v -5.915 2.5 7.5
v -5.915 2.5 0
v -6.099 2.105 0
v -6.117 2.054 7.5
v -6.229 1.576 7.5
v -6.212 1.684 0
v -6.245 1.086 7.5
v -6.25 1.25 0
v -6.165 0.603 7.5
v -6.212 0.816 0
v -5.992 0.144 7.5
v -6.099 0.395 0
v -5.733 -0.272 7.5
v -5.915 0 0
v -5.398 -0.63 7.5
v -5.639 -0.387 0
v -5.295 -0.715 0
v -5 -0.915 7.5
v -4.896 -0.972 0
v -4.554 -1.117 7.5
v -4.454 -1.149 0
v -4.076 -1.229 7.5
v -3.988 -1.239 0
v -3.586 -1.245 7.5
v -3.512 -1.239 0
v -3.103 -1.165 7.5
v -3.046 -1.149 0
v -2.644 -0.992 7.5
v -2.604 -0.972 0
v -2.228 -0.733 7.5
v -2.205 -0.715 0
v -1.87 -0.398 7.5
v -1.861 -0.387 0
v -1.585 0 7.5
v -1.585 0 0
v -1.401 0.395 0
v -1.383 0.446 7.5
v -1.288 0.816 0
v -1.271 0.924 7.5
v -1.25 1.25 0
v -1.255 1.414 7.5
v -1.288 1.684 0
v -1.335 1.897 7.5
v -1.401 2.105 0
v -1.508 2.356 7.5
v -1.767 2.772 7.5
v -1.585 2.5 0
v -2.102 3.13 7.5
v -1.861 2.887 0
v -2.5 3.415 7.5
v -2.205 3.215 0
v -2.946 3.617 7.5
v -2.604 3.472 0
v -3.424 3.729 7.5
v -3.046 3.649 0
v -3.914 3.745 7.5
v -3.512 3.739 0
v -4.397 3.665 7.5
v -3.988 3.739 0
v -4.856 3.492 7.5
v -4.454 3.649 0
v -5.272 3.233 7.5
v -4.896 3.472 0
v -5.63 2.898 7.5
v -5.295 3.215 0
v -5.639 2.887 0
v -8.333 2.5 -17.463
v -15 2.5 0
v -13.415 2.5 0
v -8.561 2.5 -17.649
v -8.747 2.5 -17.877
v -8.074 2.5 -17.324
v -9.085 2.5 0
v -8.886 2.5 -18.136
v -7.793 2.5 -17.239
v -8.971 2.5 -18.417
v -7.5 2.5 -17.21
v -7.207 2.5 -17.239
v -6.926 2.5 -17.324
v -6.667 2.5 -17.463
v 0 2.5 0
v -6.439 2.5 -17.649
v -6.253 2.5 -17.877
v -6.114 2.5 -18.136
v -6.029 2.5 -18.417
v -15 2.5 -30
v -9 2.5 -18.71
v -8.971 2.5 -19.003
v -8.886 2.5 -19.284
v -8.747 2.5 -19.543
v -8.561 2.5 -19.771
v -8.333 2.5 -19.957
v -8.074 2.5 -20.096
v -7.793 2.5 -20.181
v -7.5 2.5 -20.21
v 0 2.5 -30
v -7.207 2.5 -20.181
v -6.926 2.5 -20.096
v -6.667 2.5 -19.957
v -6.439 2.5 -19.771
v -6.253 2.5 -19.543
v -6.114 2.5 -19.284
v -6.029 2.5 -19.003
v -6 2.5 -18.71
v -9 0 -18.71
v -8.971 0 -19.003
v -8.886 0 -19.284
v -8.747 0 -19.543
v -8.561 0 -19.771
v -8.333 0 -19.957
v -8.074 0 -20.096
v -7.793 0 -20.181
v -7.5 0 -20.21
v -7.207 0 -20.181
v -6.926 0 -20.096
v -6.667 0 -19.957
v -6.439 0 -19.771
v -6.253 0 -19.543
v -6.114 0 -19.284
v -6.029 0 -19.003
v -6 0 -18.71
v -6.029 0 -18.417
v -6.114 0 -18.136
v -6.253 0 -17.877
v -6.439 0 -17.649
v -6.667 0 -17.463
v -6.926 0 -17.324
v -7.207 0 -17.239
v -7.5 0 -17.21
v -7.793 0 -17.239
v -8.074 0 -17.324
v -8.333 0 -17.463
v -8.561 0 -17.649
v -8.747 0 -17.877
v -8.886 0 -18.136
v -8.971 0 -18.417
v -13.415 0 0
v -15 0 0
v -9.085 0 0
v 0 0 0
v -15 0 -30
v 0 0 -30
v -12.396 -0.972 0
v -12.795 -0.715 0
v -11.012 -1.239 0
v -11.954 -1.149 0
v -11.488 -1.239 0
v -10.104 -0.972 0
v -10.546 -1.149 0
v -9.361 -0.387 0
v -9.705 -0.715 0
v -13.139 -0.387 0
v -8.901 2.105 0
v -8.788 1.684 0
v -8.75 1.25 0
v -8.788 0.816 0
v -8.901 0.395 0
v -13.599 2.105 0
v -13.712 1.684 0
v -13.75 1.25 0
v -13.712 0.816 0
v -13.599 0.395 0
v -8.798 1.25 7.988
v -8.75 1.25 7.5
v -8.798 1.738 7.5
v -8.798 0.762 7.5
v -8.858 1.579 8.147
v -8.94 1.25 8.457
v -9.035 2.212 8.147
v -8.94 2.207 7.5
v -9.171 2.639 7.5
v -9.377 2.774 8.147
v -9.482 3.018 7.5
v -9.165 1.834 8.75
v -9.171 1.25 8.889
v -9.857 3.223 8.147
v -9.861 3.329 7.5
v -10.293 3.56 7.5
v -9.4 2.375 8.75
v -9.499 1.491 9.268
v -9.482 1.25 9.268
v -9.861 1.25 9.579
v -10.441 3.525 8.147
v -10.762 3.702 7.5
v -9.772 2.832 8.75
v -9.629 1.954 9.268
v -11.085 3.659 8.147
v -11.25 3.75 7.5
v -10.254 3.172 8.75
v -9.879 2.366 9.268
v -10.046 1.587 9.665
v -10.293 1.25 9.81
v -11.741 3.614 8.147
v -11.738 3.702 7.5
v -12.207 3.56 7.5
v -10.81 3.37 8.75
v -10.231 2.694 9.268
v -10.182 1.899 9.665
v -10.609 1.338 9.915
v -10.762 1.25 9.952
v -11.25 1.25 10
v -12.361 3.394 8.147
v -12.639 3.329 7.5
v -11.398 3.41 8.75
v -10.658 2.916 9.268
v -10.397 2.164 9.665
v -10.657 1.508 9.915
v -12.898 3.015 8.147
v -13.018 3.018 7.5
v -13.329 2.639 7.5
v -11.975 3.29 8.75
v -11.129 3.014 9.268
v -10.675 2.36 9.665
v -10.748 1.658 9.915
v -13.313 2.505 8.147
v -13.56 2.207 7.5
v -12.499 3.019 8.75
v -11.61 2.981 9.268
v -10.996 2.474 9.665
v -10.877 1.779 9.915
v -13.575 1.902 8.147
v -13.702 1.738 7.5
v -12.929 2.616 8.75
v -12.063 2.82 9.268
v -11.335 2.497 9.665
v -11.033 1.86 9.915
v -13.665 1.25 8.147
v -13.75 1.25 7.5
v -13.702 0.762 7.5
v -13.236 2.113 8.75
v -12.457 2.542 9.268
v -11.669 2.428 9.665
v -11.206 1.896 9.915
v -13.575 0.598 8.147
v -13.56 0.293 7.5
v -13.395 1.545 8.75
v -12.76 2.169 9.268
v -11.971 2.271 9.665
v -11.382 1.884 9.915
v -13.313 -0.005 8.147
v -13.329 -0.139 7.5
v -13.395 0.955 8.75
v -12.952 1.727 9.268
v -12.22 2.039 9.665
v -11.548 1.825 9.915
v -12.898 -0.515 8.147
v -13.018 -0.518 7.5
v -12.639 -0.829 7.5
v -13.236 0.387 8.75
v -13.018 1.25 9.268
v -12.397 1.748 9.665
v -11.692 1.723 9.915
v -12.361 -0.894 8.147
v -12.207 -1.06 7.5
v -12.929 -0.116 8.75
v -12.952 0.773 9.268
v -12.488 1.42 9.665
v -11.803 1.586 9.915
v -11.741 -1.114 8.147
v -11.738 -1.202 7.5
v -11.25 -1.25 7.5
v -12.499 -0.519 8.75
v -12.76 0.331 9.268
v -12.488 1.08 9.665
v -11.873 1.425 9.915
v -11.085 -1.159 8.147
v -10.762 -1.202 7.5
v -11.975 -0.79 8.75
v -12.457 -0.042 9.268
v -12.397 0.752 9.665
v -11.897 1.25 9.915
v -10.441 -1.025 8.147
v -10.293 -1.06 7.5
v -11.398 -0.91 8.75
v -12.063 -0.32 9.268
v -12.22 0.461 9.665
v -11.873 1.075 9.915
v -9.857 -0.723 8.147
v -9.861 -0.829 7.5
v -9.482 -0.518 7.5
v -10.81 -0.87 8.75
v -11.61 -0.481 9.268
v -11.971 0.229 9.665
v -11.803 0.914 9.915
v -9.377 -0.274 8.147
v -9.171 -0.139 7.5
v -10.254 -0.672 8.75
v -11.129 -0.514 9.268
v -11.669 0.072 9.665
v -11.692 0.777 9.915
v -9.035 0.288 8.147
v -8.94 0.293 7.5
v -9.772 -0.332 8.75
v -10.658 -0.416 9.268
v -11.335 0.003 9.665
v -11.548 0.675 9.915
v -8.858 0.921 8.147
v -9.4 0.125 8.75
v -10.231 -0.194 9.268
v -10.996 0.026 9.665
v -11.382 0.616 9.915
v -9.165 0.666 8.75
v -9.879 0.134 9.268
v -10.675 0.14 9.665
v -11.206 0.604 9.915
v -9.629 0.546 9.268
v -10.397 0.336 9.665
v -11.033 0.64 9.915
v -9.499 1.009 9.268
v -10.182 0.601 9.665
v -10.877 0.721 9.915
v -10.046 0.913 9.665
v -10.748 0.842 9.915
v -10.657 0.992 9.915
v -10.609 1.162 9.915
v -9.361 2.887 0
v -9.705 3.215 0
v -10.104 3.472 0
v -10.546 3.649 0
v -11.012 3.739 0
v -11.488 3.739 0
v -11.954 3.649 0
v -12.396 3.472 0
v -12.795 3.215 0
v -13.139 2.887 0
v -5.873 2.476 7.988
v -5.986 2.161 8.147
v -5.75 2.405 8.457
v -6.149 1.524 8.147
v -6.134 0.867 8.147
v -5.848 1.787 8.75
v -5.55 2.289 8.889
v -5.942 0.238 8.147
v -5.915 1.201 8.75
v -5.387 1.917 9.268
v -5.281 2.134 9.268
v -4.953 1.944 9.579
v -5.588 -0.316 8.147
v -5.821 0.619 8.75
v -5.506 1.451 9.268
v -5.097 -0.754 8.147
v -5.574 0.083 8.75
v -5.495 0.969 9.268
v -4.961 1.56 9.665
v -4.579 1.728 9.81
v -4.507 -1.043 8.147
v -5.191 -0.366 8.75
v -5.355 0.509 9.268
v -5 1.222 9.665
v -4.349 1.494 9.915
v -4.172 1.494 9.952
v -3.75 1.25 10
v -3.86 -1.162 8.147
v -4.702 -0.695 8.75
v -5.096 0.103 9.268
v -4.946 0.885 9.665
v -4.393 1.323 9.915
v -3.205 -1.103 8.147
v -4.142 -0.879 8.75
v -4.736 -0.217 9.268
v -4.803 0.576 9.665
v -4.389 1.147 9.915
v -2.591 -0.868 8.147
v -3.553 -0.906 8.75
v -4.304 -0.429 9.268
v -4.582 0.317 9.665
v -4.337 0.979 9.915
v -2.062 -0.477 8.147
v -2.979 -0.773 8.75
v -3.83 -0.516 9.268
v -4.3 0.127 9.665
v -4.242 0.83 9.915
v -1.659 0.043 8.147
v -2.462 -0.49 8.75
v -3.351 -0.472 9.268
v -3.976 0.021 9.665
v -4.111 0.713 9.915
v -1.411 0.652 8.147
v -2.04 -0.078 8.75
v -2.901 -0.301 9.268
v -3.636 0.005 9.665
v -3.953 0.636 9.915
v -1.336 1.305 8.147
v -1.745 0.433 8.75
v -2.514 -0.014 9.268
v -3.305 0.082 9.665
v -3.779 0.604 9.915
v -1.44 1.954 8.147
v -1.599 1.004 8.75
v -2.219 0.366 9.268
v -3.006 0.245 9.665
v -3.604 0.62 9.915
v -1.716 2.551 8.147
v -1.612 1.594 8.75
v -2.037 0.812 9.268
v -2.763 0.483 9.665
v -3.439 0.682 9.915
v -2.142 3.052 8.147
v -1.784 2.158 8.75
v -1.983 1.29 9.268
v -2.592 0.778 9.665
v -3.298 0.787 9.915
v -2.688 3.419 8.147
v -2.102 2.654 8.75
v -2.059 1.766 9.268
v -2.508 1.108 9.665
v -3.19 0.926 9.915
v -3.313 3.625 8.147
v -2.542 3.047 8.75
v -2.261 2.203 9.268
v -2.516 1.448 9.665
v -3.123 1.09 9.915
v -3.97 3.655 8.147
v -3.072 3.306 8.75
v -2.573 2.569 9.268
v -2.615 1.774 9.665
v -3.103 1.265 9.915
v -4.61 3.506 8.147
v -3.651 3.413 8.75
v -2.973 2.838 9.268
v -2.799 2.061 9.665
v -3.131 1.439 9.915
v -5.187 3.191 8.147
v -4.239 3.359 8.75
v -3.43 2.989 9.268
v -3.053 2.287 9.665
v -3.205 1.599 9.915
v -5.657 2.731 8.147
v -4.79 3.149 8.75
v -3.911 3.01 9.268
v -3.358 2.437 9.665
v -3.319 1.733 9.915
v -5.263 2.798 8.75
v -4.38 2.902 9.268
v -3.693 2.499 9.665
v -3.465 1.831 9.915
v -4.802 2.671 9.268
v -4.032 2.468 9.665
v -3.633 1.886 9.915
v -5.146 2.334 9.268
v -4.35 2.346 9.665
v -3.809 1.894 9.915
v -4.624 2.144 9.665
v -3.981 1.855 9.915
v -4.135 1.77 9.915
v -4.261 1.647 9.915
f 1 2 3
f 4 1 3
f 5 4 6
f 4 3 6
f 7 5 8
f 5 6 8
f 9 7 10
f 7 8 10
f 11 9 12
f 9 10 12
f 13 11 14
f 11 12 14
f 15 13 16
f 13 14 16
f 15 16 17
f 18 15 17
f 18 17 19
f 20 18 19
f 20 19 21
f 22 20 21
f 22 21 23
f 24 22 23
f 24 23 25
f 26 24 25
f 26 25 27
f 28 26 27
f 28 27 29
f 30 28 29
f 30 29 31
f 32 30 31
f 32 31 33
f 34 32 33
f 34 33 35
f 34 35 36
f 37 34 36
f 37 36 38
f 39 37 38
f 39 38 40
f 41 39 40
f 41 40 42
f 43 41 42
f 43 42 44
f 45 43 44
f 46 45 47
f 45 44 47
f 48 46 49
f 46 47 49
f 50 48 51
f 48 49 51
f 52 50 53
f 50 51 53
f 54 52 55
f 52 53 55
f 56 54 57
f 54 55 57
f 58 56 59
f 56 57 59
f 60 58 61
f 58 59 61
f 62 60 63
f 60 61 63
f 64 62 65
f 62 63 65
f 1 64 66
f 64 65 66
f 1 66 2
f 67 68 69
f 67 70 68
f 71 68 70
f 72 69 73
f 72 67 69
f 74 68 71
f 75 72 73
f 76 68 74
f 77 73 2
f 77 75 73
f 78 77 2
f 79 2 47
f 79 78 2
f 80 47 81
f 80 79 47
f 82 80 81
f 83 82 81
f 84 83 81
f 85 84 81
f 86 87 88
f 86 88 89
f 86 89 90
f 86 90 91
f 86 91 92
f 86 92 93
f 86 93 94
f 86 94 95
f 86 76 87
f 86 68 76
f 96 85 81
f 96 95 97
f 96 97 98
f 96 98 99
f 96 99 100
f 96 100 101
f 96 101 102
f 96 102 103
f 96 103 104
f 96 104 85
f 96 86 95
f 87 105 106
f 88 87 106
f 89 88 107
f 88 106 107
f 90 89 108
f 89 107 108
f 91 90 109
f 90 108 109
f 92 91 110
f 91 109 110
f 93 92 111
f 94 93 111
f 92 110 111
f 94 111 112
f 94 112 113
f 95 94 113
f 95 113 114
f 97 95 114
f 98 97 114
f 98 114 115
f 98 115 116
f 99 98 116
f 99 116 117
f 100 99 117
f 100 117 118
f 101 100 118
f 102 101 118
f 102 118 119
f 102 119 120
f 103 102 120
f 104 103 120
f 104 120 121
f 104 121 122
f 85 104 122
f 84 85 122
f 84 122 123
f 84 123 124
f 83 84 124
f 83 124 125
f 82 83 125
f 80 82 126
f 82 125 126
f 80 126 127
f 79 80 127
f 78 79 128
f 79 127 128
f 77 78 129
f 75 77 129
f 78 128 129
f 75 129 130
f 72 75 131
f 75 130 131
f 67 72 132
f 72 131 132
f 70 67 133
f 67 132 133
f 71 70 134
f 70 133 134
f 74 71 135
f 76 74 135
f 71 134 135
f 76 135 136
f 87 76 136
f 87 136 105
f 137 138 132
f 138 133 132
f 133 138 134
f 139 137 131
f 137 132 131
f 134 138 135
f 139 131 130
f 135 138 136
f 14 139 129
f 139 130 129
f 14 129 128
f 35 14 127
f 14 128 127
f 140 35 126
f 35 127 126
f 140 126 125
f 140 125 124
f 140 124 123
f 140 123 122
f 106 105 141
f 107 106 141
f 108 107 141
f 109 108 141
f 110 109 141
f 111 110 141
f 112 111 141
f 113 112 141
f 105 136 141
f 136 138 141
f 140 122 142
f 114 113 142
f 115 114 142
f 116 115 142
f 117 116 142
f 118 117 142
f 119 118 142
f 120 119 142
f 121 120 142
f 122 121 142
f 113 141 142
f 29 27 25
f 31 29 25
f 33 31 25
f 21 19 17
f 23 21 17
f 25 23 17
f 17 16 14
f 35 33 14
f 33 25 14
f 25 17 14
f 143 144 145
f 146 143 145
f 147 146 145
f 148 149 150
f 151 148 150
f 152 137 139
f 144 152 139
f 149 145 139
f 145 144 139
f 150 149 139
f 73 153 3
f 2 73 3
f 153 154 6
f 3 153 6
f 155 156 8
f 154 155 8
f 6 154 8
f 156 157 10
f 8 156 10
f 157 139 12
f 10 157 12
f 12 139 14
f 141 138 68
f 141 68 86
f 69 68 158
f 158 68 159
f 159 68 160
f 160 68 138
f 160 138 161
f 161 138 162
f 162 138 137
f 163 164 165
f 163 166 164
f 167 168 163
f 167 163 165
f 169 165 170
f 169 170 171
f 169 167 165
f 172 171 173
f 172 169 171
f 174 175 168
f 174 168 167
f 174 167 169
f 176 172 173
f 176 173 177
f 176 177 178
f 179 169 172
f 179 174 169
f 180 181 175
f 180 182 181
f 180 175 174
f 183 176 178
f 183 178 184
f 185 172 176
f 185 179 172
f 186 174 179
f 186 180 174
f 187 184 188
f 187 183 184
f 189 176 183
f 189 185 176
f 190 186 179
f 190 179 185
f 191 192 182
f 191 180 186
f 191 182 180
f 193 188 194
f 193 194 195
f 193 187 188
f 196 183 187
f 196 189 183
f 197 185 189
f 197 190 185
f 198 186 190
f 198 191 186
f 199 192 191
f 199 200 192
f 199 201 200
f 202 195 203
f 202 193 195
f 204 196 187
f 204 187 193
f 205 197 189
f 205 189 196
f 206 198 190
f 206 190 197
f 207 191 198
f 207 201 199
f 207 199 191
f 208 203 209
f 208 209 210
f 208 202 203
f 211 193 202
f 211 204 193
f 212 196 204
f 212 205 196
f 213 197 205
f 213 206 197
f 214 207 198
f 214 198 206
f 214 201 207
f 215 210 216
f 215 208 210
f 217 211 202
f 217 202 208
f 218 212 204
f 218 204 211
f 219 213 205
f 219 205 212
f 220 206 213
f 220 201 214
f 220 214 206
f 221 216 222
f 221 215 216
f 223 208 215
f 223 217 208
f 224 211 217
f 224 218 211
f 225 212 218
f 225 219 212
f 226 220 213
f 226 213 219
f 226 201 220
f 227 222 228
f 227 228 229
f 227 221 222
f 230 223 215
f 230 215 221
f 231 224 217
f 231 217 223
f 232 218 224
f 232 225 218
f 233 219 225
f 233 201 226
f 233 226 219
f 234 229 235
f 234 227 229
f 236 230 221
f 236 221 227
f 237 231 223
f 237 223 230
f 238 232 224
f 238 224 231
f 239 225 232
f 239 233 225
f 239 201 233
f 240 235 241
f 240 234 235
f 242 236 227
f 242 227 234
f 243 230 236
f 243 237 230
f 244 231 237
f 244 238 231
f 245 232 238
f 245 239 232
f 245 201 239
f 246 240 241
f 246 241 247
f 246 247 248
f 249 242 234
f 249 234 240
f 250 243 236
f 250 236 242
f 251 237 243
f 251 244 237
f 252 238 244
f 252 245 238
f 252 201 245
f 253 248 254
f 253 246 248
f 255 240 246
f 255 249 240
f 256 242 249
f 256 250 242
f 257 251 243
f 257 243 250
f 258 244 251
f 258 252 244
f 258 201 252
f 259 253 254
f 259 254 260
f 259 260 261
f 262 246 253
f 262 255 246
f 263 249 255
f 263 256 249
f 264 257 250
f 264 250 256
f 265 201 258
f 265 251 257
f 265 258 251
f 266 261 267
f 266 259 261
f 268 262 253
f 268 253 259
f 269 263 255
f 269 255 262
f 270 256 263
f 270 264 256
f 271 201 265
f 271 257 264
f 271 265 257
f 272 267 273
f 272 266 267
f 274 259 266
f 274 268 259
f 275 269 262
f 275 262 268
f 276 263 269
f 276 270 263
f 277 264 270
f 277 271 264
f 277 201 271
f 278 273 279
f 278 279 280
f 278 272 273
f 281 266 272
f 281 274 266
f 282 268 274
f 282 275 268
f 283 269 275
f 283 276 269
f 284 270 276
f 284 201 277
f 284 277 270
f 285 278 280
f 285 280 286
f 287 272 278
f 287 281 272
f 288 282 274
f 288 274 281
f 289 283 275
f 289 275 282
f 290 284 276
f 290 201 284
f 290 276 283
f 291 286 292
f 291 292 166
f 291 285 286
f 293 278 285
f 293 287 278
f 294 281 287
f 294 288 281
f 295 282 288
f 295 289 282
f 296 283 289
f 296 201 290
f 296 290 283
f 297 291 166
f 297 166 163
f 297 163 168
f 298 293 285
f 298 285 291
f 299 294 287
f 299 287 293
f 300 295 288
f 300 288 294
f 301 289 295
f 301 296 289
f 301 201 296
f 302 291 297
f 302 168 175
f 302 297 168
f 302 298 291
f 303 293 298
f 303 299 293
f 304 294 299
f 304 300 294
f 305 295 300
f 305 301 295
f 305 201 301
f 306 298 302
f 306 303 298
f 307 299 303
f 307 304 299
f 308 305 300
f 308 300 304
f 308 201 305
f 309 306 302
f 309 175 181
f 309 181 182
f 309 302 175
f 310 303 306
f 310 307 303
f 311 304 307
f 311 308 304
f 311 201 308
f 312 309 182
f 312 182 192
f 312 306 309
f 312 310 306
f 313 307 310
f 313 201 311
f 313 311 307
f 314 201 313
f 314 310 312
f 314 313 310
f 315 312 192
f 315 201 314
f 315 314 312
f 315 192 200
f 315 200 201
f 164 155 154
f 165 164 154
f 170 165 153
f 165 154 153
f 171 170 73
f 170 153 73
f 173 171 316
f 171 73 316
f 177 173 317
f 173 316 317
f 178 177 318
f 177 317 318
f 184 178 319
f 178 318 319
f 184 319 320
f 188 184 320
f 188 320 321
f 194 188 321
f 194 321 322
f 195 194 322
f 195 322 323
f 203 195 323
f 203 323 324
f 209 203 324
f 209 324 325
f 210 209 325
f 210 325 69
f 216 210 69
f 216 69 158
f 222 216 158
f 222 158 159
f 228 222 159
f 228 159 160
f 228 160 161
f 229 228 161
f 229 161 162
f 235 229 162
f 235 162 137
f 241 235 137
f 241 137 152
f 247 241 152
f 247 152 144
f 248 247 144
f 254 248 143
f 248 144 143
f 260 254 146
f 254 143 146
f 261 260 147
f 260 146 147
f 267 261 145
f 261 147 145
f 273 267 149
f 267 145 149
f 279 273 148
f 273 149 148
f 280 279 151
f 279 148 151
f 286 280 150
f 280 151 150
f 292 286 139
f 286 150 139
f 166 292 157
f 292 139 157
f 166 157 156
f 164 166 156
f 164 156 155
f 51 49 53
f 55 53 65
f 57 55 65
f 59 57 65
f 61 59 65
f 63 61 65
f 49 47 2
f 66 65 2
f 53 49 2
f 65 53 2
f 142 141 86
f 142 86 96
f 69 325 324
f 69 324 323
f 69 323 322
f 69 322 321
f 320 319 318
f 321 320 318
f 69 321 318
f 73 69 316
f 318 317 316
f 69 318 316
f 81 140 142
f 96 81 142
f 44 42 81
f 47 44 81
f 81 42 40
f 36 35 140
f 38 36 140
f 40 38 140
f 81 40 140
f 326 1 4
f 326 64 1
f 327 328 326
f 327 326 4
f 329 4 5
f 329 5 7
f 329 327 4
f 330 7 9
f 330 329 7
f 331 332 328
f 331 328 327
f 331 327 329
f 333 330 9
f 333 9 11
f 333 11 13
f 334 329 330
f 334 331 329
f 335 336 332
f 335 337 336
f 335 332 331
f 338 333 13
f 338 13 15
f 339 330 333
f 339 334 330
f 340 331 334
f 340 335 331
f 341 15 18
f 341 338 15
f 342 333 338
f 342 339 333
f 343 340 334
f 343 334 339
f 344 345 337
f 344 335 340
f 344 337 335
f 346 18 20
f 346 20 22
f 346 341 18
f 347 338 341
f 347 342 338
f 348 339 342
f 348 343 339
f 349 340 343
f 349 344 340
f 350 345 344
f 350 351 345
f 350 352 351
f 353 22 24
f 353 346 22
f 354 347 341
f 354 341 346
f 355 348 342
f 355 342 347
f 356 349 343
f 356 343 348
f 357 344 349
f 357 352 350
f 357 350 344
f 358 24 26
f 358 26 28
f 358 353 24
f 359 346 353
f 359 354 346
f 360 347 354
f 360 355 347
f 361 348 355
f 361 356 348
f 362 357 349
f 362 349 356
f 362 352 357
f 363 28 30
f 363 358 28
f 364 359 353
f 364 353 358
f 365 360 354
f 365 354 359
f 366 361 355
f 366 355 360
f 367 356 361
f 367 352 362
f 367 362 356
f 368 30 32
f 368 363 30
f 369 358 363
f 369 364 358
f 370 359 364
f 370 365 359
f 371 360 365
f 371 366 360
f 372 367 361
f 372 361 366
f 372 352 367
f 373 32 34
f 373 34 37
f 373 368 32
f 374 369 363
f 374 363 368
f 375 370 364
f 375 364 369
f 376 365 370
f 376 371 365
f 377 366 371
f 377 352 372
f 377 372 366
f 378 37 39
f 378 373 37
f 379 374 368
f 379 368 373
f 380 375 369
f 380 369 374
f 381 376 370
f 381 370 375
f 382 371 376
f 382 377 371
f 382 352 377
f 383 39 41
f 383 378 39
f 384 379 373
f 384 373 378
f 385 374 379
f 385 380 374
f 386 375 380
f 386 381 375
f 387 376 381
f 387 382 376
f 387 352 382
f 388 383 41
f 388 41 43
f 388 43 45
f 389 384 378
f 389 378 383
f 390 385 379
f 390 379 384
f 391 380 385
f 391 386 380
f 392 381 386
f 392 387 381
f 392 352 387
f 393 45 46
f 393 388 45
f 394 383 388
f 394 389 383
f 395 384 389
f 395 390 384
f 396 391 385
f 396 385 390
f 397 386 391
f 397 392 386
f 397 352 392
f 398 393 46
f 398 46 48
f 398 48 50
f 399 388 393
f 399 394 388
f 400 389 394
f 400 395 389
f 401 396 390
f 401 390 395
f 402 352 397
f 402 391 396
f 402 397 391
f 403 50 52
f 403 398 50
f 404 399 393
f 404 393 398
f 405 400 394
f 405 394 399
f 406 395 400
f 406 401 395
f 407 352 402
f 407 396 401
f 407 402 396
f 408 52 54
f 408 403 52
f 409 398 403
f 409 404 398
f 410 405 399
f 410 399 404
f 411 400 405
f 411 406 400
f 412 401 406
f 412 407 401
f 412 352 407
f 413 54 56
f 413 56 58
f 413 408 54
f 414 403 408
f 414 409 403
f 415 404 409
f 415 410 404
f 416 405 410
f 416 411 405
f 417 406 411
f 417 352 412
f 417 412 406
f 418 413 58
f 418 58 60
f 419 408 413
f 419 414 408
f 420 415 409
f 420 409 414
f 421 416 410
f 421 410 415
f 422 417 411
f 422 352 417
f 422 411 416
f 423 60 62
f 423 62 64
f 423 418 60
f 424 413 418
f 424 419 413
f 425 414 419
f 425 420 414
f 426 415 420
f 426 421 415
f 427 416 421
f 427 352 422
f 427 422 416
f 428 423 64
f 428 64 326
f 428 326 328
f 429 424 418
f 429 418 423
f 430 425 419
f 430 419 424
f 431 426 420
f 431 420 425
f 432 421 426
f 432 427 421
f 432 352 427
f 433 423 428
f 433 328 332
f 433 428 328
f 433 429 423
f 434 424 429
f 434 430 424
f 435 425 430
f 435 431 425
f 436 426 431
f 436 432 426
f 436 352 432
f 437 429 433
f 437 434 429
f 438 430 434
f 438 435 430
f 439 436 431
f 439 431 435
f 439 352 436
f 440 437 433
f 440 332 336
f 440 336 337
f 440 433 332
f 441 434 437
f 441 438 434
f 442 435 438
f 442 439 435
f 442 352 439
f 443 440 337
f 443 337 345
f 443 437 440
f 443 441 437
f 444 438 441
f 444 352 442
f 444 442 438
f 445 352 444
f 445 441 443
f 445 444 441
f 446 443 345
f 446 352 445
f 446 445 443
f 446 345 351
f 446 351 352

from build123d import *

# Parameters (mm, degrees)
SKETCH2_W                 = 15
SKETCH2_H                 = 30
BOSS_EXTRUDE1_DEPTH       = 2.5
SKETCH3_R                 = 2.5
BOSS_EXTRUDE2_DEPTH       = 10
FILLET3_R                 = 2.5
FILLET4_R                 = 2.5
F_3_0MM_DOWEL_HOLE1_D     = 3
F_3_0MM_DOWEL_HOLE1_DEPTH = 12
F_3_0MM_DOWEL_HOLE1_TIP   = 0.901290929


with BuildPart() as part:
    # Sketch2 → Boss-Extrude1 (new body)
    with BuildSketch(Plane(origin=(0, 0, 0), x_dir=(1, 0, 0), z_dir=(0, 1, 0))):
        with Locations((-7.5, 15)):
            Rectangle(SKETCH2_W, SKETCH2_H)
    extrude(amount=BOSS_EXTRUDE1_DEPTH)

    # Sketch3 → Boss-Extrude2 (add)
    with BuildSketch(Plane.XY):
        with BuildLine():
            ThreePointArc((-13.75, 1.25), (-11.25, -1.25), (-8.75, 1.25))
            Line((-8.75, 1.25), (-13.75, 1.25))
        make_face()
        with BuildLine():
            Line((-13.75, 1.25), (-8.75, 1.25))
            ThreePointArc((-8.75, 1.25), (-11.25, 3.75), (-13.75, 1.25))
        make_face()
        with Locations(Location((-3.75, 1.25, 0), (0, 0, 150))):
            Circle(SKETCH3_R)
    extrude(amount=BOSS_EXTRUDE2_DEPTH)

    # Fillet3
    fillet3_edges = [part.edges().sort_by_distance(p)[0] for p in [
        (-13.75, 1.25, 10),
    ]]
    fillet(fillet3_edges, radius=FILLET3_R)

    # Fillet4
    fillet4_edges = [part.edges().sort_by_distance(p)[0] for p in [
        (-1.584936491, 0, 10),
    ]]
    fillet(fillet4_edges, radius=FILLET4_R)

    # Ø3.0mm Dowel Hole1
    with Locations(Plane(origin=(0, 2.5, 0), x_dir=(1, 0, 0), z_dir=(0, 1, 0))):
        with Locations((-7.5, 18.71)):
            Hole(F_3_0MM_DOWEL_HOLE1_D / 2, depth=F_3_0MM_DOWEL_HOLE1_DEPTH)
            with Locations((0, 0, -(F_3_0MM_DOWEL_HOLE1_DEPTH + F_3_0MM_DOWEL_HOLE1_TIP / 2))):  # 118° drill point
                Cone(0, F_3_0MM_DOWEL_HOLE1_D / 2, F_3_0MM_DOWEL_HOLE1_TIP, mode=Mode.SUBTRACT)


solid = part.part
